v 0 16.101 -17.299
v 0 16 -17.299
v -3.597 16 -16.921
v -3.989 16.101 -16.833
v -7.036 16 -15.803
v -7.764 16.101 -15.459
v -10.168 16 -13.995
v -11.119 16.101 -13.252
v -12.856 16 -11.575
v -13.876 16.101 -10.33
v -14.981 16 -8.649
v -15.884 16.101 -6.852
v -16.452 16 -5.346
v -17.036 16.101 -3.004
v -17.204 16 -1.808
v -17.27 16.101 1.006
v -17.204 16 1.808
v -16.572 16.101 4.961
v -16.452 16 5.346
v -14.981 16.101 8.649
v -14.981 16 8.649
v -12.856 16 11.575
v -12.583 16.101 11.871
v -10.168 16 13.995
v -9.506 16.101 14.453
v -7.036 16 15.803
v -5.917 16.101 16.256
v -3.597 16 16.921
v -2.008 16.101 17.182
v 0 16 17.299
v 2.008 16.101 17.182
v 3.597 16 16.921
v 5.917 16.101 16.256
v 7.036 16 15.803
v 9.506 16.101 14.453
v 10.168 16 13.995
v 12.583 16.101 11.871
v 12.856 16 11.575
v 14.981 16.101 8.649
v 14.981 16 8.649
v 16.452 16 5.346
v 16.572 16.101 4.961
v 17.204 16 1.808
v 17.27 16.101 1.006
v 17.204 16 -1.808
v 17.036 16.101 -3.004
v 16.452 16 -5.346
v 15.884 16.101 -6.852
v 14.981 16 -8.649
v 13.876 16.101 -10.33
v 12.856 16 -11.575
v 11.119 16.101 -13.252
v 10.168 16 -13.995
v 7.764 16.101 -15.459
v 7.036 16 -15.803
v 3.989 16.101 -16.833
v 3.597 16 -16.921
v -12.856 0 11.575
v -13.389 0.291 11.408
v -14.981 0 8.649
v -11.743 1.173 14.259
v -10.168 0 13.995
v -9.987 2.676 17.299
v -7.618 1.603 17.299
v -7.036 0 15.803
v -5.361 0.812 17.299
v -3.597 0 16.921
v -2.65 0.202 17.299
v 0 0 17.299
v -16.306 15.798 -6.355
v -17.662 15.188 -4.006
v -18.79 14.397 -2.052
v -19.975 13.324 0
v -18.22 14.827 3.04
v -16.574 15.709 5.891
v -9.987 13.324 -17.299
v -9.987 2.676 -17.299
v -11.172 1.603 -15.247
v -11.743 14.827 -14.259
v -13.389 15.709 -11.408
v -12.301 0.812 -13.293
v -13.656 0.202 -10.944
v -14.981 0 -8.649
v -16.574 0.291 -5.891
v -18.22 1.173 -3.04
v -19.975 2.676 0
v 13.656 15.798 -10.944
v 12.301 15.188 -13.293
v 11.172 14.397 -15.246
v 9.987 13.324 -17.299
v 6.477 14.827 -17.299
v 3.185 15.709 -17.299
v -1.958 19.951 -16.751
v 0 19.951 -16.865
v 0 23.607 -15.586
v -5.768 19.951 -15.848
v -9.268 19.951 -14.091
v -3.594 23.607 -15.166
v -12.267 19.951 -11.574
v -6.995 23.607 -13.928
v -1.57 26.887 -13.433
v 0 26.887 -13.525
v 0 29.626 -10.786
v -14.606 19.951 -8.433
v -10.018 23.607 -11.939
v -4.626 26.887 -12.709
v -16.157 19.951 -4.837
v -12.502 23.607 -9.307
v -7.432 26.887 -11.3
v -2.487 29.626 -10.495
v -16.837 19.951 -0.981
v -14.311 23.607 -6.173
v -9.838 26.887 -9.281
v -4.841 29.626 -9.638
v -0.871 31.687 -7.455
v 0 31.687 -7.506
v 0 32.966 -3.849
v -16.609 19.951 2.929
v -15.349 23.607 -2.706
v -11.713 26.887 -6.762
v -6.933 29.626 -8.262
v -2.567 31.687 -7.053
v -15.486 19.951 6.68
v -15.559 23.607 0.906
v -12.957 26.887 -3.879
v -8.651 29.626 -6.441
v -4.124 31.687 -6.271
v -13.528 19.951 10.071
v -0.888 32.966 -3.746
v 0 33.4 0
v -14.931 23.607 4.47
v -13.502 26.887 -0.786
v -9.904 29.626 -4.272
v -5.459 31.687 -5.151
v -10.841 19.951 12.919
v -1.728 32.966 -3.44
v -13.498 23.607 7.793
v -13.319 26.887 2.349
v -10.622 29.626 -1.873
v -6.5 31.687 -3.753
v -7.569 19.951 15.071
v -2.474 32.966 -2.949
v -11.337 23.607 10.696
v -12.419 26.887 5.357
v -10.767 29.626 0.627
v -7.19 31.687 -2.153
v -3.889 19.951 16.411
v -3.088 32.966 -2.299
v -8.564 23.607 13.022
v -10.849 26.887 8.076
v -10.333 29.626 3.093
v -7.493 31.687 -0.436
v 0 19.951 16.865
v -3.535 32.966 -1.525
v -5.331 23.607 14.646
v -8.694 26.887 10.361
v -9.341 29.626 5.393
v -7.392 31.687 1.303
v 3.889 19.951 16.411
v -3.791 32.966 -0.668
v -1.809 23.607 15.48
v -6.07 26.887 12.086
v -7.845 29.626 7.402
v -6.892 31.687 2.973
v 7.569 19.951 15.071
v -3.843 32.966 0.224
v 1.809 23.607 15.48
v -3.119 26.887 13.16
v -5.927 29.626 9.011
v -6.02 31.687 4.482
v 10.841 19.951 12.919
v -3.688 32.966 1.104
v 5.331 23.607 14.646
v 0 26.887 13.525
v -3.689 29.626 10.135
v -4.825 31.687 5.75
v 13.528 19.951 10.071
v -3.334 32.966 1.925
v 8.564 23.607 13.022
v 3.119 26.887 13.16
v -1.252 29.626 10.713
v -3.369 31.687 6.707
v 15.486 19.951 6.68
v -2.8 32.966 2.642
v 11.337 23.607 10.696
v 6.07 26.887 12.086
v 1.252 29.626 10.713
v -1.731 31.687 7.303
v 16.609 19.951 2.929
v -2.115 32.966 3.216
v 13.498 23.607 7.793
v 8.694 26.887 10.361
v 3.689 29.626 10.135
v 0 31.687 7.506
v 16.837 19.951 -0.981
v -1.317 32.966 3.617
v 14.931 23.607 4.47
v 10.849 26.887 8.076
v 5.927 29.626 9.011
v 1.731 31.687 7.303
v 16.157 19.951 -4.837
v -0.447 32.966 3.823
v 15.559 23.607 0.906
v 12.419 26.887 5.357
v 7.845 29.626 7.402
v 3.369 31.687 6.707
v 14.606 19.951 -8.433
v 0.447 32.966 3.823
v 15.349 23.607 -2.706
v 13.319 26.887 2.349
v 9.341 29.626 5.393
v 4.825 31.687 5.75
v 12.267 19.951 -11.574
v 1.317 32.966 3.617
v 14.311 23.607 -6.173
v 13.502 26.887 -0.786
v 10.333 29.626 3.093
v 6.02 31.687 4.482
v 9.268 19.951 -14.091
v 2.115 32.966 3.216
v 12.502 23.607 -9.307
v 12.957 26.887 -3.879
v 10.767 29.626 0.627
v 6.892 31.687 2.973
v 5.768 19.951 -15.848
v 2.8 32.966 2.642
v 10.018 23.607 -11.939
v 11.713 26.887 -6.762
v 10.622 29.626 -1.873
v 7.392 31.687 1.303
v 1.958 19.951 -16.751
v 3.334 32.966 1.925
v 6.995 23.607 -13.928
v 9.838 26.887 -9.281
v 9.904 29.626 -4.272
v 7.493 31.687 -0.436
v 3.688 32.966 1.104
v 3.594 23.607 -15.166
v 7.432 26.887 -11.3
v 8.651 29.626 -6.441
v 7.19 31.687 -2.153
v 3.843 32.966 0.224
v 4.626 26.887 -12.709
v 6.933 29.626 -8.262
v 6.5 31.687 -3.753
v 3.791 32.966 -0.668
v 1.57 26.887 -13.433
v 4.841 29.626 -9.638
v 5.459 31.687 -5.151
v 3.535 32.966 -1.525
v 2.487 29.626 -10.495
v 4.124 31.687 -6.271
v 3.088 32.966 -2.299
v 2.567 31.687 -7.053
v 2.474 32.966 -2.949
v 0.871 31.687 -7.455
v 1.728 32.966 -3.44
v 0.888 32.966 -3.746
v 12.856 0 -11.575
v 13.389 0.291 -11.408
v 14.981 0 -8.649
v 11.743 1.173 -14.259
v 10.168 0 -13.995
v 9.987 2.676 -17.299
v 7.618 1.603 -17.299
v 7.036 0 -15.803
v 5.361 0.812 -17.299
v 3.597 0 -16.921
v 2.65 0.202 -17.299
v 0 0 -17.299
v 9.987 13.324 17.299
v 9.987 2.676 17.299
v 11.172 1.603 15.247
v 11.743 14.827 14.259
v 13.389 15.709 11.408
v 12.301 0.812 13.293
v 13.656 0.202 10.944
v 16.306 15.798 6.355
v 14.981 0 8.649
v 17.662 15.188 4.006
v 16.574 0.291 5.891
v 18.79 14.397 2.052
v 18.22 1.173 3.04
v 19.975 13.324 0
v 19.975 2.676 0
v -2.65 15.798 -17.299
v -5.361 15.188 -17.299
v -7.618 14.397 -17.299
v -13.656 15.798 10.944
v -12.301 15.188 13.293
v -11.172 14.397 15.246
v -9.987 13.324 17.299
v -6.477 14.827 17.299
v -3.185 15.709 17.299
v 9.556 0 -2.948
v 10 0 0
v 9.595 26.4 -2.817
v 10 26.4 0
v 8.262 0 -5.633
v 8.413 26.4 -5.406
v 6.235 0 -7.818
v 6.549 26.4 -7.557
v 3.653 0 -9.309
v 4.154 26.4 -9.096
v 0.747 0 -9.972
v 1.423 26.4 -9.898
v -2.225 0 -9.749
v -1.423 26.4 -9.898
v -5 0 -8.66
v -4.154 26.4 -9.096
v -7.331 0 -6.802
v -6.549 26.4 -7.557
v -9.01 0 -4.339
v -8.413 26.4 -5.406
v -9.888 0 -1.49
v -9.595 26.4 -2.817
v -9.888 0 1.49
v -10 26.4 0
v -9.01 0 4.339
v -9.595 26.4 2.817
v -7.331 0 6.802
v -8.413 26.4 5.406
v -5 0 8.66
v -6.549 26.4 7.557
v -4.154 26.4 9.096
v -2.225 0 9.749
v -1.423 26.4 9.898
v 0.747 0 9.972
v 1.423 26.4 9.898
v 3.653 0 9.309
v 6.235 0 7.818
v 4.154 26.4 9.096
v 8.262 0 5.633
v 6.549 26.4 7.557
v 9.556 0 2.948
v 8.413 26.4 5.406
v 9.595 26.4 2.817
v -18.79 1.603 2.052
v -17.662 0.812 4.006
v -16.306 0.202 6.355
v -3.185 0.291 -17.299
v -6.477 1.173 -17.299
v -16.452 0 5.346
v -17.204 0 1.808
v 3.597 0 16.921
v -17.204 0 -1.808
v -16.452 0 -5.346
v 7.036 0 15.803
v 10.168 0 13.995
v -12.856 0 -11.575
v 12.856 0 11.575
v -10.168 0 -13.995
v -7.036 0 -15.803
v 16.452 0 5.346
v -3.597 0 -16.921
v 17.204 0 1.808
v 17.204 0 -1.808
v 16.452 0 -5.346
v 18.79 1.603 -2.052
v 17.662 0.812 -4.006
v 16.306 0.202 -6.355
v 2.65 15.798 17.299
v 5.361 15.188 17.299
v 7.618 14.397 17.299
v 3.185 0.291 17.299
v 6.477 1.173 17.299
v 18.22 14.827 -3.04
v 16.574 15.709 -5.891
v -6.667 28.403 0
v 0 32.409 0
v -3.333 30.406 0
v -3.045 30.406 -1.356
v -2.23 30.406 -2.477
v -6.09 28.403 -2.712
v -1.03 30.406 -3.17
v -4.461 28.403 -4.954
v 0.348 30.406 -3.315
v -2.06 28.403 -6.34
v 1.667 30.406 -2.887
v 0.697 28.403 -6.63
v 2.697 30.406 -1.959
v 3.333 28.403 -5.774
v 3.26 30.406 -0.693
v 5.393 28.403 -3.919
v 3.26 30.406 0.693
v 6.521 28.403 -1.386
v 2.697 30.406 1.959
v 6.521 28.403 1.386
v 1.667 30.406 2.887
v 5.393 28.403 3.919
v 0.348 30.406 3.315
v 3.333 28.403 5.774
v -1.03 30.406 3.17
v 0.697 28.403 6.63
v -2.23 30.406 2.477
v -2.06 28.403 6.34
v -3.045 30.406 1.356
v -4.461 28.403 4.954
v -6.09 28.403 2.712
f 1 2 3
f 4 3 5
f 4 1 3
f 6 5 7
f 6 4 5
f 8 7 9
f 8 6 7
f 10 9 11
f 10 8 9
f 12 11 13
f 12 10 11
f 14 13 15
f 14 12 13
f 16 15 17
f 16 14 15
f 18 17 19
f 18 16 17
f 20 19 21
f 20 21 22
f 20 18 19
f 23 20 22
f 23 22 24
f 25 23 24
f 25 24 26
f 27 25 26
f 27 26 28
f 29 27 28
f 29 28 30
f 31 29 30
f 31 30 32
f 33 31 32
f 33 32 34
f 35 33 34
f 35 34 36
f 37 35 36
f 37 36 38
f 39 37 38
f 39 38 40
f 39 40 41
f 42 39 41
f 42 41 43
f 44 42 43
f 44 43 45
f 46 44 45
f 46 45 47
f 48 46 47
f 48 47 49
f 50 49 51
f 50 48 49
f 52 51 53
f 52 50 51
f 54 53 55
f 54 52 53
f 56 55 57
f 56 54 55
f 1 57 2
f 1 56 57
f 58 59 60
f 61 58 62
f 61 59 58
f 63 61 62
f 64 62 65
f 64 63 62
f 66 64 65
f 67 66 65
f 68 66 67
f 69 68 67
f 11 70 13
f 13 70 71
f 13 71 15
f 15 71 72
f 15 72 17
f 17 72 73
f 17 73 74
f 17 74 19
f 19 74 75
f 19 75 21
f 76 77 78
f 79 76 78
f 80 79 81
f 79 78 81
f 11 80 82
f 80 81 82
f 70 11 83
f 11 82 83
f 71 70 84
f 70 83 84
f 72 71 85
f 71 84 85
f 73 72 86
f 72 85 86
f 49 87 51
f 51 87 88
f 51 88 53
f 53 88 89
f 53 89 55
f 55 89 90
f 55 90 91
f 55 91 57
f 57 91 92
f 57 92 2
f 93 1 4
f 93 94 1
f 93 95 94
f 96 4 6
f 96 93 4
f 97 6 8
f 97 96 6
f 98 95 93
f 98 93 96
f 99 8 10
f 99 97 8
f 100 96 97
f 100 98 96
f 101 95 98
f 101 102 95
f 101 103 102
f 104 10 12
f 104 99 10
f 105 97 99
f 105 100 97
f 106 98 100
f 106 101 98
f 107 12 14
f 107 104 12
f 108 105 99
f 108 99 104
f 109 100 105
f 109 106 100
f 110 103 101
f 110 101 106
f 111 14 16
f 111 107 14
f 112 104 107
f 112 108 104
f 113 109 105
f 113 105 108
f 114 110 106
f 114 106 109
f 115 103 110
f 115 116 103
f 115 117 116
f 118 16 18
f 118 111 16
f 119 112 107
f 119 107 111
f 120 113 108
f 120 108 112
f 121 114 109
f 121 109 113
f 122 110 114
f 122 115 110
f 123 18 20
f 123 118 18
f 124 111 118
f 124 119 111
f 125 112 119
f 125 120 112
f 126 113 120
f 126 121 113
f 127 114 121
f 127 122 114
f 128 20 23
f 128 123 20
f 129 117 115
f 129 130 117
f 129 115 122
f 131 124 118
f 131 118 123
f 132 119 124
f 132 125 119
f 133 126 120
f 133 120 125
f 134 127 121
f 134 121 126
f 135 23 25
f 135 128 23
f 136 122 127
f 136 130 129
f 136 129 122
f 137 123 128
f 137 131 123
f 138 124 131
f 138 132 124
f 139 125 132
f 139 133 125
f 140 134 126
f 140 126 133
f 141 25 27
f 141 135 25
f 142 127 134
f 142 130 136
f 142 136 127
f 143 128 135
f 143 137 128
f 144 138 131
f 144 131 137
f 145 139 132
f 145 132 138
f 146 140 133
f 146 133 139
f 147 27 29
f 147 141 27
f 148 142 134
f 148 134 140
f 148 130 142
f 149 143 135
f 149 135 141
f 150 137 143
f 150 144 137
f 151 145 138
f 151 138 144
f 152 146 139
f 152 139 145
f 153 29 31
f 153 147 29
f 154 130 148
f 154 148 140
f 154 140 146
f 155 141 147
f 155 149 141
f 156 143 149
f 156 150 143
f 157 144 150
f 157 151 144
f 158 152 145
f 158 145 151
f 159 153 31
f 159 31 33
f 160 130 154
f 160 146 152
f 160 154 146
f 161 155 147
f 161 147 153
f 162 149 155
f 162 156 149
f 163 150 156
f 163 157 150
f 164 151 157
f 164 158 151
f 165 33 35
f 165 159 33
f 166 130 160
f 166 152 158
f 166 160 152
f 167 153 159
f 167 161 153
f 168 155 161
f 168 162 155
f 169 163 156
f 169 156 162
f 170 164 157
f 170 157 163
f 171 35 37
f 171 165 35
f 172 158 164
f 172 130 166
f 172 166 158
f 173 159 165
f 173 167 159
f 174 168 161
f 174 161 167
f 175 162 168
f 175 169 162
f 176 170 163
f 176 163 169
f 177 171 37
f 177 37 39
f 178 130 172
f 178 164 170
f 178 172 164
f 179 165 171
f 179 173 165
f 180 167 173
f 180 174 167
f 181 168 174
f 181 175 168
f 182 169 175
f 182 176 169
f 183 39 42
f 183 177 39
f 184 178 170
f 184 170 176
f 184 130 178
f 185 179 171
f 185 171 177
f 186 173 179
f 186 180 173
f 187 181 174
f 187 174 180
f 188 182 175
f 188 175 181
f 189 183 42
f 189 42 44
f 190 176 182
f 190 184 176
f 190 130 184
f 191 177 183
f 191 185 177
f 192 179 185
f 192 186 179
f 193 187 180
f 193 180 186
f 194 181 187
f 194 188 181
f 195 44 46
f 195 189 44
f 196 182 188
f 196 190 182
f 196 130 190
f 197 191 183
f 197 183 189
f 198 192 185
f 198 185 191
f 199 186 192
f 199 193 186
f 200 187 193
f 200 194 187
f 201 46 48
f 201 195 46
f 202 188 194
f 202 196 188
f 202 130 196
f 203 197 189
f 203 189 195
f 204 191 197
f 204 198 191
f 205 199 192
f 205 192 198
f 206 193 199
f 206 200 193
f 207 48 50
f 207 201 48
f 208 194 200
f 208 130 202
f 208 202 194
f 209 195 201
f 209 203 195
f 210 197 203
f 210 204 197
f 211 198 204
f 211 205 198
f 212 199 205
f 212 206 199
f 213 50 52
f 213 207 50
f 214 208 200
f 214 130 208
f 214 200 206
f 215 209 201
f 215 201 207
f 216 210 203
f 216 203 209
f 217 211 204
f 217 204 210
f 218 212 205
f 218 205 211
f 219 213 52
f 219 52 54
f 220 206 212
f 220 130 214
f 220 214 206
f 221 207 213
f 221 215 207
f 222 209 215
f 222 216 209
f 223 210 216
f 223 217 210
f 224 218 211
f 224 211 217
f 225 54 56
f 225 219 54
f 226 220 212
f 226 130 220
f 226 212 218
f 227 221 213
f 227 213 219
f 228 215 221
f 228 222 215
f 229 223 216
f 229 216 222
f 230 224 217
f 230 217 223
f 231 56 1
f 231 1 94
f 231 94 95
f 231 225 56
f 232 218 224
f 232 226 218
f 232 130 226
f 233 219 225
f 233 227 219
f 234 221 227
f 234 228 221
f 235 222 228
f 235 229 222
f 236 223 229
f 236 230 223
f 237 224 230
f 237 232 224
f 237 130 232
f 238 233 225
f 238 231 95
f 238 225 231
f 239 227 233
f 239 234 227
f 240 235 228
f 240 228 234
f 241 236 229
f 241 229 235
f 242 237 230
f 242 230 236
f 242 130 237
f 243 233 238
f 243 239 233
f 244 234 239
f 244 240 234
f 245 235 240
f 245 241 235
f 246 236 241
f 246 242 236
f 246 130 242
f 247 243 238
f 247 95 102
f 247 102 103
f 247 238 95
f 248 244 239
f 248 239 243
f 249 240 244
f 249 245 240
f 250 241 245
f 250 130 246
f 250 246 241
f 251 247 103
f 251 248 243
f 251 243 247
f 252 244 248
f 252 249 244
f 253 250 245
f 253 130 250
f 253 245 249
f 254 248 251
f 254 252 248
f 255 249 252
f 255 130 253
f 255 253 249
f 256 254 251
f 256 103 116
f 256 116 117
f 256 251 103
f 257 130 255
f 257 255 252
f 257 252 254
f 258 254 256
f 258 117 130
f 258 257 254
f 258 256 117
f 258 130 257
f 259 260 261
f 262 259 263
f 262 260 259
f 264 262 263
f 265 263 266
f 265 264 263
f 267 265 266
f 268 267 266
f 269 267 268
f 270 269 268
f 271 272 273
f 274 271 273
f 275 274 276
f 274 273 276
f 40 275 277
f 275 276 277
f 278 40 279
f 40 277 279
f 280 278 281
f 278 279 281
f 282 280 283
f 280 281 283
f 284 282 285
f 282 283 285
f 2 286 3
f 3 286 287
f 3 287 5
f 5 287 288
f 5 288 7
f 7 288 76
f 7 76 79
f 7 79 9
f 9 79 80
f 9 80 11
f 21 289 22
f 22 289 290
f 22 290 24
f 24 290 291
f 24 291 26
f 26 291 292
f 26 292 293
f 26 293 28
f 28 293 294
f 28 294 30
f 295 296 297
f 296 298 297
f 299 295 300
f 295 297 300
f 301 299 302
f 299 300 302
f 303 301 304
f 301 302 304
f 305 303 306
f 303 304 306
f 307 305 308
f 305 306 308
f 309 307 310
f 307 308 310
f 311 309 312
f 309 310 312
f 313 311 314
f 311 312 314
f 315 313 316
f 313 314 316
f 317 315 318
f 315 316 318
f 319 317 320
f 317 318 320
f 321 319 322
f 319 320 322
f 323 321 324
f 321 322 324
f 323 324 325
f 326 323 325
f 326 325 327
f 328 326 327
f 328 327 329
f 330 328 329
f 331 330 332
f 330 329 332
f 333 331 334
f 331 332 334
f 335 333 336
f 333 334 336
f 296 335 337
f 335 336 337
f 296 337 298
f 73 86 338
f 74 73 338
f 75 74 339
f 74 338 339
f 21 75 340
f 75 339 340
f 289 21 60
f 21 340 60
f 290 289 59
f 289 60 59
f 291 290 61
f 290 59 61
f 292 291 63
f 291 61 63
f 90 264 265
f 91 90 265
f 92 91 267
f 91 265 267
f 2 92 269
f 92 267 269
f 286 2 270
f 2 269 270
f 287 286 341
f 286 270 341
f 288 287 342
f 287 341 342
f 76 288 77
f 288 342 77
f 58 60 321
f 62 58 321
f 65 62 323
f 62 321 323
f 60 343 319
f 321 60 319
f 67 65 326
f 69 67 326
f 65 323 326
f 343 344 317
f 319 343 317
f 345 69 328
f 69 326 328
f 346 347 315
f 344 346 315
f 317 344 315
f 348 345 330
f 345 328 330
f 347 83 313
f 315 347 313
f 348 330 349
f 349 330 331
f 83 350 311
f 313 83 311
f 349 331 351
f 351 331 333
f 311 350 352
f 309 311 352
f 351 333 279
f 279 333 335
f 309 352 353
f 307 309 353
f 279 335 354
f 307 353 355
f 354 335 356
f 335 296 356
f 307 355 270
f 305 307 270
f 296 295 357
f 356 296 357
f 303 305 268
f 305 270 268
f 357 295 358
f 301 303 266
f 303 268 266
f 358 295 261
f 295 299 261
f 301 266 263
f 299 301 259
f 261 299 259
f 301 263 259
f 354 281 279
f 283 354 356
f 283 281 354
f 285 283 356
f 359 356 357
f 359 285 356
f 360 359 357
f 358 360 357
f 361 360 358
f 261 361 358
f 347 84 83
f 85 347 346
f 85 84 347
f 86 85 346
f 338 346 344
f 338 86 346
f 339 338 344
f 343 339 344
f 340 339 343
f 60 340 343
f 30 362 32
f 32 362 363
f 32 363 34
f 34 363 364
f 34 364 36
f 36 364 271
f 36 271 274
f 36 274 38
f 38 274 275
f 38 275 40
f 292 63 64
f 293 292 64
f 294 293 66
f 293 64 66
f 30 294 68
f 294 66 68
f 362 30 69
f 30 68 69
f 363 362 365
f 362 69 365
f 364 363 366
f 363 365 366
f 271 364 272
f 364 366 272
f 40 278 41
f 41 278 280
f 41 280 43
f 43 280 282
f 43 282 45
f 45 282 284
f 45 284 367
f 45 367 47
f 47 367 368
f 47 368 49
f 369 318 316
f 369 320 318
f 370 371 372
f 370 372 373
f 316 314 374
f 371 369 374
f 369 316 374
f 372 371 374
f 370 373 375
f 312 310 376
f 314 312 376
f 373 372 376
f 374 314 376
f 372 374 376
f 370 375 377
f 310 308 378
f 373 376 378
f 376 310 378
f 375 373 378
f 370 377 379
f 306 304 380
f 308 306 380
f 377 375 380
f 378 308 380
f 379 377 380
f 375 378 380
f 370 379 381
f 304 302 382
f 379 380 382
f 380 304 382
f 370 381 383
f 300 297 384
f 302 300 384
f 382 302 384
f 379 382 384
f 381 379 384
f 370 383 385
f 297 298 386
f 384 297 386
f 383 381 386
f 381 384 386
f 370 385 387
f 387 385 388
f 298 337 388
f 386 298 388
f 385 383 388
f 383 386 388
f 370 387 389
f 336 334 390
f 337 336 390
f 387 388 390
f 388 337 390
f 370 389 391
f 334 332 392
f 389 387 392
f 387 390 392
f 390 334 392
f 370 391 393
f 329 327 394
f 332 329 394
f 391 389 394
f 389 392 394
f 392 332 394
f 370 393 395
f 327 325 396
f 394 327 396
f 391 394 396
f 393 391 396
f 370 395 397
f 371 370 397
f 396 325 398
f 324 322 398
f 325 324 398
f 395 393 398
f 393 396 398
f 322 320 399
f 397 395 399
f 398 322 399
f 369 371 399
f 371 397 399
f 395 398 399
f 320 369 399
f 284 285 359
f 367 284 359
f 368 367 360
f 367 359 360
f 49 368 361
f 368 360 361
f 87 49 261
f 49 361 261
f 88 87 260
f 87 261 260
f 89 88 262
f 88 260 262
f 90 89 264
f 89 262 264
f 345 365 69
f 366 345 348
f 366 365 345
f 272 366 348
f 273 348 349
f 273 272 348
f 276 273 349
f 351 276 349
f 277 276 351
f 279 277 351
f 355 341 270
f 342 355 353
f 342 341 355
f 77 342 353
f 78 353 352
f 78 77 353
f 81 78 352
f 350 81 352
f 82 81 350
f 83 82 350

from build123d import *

# Parameters (mm, degrees)
BOSS_EXTRUDE1_DEPTH       = 16
F_1_0MM_DOWEL_HOLE1_D     = 20
F_1_0MM_DOWEL_HOLE1_DEPTH = 26.4
F_1_0MM_DOWEL_HOLE1_TIP   = 6.00860619


with BuildPart() as part:
    # Sketch1 → Boss-Extrude1 (new body)
    with BuildSketch(Plane(origin=(0, 0, 0), x_dir=(1, 0, 0), z_dir=(0, 1, 0))):
        Polygon((19.975, 0), (9.9875, 17.298857441), (-9.9875, 17.298857441), (-19.975, 0), (-9.9875, -17.298857441), (9.9875, -17.298857441), align=None)
    extrude(amount=BOSS_EXTRUDE1_DEPTH)

    # Sketch2 → Revolve1 (revolve)
    with BuildSketch(Plane.ZY):
        with BuildLine():
            Line((-17.298857441, 16), (-17.298857441, 16.101142559))
            ThreePointArc((-17.298857441, 16.101142559), (-12.232139403, 28.333281962), (0, 33.4))
            Line((0, 33.4), (0, 16))
            Line((0, 16), (-17.298857441, 16))
        make_face()
    revolve(axis=Axis((0, 16, 0), (0, 1, 0)))

    # Ø1.0mm Dowel Hole1
    with Locations(Plane(origin=(0, 0, 0), x_dir=(-1, 0, 0), z_dir=(0, -1, 0))):
        with Locations((0, 0)):
            Hole(F_1_0MM_DOWEL_HOLE1_D / 2, depth=F_1_0MM_DOWEL_HOLE1_DEPTH)
            with Locations((0, 0, -(F_1_0MM_DOWEL_HOLE1_DEPTH + F_1_0MM_DOWEL_HOLE1_TIP / 2))):  # 118° drill point
                Cone(0, F_1_0MM_DOWEL_HOLE1_D / 2, F_1_0MM_DOWEL_HOLE1_TIP, mode=Mode.SUBTRACT)

    # Sketch6 → Cut-Revolve1 (revolve, cut)
    with BuildSketch(Plane.XY, mode=Mode.PRIVATE) as cut_revolve1_sk:
        Polygon((17.298857441, 16), (19.975, 13.323857441), (19.975, 16), align=None)
        Polygon((19.975, 2.676142559), (19.975, 0), (17.298857441, 0), align=None)
    revolve(cut_revolve1_sk.sketch.rotate(Axis((0, 16, 0), (0, 1, 0)), 90), axis=Axis((0, 16, 0), (0, 1, 0)), mode=Mode.SUBTRACT)


solid = part.part
